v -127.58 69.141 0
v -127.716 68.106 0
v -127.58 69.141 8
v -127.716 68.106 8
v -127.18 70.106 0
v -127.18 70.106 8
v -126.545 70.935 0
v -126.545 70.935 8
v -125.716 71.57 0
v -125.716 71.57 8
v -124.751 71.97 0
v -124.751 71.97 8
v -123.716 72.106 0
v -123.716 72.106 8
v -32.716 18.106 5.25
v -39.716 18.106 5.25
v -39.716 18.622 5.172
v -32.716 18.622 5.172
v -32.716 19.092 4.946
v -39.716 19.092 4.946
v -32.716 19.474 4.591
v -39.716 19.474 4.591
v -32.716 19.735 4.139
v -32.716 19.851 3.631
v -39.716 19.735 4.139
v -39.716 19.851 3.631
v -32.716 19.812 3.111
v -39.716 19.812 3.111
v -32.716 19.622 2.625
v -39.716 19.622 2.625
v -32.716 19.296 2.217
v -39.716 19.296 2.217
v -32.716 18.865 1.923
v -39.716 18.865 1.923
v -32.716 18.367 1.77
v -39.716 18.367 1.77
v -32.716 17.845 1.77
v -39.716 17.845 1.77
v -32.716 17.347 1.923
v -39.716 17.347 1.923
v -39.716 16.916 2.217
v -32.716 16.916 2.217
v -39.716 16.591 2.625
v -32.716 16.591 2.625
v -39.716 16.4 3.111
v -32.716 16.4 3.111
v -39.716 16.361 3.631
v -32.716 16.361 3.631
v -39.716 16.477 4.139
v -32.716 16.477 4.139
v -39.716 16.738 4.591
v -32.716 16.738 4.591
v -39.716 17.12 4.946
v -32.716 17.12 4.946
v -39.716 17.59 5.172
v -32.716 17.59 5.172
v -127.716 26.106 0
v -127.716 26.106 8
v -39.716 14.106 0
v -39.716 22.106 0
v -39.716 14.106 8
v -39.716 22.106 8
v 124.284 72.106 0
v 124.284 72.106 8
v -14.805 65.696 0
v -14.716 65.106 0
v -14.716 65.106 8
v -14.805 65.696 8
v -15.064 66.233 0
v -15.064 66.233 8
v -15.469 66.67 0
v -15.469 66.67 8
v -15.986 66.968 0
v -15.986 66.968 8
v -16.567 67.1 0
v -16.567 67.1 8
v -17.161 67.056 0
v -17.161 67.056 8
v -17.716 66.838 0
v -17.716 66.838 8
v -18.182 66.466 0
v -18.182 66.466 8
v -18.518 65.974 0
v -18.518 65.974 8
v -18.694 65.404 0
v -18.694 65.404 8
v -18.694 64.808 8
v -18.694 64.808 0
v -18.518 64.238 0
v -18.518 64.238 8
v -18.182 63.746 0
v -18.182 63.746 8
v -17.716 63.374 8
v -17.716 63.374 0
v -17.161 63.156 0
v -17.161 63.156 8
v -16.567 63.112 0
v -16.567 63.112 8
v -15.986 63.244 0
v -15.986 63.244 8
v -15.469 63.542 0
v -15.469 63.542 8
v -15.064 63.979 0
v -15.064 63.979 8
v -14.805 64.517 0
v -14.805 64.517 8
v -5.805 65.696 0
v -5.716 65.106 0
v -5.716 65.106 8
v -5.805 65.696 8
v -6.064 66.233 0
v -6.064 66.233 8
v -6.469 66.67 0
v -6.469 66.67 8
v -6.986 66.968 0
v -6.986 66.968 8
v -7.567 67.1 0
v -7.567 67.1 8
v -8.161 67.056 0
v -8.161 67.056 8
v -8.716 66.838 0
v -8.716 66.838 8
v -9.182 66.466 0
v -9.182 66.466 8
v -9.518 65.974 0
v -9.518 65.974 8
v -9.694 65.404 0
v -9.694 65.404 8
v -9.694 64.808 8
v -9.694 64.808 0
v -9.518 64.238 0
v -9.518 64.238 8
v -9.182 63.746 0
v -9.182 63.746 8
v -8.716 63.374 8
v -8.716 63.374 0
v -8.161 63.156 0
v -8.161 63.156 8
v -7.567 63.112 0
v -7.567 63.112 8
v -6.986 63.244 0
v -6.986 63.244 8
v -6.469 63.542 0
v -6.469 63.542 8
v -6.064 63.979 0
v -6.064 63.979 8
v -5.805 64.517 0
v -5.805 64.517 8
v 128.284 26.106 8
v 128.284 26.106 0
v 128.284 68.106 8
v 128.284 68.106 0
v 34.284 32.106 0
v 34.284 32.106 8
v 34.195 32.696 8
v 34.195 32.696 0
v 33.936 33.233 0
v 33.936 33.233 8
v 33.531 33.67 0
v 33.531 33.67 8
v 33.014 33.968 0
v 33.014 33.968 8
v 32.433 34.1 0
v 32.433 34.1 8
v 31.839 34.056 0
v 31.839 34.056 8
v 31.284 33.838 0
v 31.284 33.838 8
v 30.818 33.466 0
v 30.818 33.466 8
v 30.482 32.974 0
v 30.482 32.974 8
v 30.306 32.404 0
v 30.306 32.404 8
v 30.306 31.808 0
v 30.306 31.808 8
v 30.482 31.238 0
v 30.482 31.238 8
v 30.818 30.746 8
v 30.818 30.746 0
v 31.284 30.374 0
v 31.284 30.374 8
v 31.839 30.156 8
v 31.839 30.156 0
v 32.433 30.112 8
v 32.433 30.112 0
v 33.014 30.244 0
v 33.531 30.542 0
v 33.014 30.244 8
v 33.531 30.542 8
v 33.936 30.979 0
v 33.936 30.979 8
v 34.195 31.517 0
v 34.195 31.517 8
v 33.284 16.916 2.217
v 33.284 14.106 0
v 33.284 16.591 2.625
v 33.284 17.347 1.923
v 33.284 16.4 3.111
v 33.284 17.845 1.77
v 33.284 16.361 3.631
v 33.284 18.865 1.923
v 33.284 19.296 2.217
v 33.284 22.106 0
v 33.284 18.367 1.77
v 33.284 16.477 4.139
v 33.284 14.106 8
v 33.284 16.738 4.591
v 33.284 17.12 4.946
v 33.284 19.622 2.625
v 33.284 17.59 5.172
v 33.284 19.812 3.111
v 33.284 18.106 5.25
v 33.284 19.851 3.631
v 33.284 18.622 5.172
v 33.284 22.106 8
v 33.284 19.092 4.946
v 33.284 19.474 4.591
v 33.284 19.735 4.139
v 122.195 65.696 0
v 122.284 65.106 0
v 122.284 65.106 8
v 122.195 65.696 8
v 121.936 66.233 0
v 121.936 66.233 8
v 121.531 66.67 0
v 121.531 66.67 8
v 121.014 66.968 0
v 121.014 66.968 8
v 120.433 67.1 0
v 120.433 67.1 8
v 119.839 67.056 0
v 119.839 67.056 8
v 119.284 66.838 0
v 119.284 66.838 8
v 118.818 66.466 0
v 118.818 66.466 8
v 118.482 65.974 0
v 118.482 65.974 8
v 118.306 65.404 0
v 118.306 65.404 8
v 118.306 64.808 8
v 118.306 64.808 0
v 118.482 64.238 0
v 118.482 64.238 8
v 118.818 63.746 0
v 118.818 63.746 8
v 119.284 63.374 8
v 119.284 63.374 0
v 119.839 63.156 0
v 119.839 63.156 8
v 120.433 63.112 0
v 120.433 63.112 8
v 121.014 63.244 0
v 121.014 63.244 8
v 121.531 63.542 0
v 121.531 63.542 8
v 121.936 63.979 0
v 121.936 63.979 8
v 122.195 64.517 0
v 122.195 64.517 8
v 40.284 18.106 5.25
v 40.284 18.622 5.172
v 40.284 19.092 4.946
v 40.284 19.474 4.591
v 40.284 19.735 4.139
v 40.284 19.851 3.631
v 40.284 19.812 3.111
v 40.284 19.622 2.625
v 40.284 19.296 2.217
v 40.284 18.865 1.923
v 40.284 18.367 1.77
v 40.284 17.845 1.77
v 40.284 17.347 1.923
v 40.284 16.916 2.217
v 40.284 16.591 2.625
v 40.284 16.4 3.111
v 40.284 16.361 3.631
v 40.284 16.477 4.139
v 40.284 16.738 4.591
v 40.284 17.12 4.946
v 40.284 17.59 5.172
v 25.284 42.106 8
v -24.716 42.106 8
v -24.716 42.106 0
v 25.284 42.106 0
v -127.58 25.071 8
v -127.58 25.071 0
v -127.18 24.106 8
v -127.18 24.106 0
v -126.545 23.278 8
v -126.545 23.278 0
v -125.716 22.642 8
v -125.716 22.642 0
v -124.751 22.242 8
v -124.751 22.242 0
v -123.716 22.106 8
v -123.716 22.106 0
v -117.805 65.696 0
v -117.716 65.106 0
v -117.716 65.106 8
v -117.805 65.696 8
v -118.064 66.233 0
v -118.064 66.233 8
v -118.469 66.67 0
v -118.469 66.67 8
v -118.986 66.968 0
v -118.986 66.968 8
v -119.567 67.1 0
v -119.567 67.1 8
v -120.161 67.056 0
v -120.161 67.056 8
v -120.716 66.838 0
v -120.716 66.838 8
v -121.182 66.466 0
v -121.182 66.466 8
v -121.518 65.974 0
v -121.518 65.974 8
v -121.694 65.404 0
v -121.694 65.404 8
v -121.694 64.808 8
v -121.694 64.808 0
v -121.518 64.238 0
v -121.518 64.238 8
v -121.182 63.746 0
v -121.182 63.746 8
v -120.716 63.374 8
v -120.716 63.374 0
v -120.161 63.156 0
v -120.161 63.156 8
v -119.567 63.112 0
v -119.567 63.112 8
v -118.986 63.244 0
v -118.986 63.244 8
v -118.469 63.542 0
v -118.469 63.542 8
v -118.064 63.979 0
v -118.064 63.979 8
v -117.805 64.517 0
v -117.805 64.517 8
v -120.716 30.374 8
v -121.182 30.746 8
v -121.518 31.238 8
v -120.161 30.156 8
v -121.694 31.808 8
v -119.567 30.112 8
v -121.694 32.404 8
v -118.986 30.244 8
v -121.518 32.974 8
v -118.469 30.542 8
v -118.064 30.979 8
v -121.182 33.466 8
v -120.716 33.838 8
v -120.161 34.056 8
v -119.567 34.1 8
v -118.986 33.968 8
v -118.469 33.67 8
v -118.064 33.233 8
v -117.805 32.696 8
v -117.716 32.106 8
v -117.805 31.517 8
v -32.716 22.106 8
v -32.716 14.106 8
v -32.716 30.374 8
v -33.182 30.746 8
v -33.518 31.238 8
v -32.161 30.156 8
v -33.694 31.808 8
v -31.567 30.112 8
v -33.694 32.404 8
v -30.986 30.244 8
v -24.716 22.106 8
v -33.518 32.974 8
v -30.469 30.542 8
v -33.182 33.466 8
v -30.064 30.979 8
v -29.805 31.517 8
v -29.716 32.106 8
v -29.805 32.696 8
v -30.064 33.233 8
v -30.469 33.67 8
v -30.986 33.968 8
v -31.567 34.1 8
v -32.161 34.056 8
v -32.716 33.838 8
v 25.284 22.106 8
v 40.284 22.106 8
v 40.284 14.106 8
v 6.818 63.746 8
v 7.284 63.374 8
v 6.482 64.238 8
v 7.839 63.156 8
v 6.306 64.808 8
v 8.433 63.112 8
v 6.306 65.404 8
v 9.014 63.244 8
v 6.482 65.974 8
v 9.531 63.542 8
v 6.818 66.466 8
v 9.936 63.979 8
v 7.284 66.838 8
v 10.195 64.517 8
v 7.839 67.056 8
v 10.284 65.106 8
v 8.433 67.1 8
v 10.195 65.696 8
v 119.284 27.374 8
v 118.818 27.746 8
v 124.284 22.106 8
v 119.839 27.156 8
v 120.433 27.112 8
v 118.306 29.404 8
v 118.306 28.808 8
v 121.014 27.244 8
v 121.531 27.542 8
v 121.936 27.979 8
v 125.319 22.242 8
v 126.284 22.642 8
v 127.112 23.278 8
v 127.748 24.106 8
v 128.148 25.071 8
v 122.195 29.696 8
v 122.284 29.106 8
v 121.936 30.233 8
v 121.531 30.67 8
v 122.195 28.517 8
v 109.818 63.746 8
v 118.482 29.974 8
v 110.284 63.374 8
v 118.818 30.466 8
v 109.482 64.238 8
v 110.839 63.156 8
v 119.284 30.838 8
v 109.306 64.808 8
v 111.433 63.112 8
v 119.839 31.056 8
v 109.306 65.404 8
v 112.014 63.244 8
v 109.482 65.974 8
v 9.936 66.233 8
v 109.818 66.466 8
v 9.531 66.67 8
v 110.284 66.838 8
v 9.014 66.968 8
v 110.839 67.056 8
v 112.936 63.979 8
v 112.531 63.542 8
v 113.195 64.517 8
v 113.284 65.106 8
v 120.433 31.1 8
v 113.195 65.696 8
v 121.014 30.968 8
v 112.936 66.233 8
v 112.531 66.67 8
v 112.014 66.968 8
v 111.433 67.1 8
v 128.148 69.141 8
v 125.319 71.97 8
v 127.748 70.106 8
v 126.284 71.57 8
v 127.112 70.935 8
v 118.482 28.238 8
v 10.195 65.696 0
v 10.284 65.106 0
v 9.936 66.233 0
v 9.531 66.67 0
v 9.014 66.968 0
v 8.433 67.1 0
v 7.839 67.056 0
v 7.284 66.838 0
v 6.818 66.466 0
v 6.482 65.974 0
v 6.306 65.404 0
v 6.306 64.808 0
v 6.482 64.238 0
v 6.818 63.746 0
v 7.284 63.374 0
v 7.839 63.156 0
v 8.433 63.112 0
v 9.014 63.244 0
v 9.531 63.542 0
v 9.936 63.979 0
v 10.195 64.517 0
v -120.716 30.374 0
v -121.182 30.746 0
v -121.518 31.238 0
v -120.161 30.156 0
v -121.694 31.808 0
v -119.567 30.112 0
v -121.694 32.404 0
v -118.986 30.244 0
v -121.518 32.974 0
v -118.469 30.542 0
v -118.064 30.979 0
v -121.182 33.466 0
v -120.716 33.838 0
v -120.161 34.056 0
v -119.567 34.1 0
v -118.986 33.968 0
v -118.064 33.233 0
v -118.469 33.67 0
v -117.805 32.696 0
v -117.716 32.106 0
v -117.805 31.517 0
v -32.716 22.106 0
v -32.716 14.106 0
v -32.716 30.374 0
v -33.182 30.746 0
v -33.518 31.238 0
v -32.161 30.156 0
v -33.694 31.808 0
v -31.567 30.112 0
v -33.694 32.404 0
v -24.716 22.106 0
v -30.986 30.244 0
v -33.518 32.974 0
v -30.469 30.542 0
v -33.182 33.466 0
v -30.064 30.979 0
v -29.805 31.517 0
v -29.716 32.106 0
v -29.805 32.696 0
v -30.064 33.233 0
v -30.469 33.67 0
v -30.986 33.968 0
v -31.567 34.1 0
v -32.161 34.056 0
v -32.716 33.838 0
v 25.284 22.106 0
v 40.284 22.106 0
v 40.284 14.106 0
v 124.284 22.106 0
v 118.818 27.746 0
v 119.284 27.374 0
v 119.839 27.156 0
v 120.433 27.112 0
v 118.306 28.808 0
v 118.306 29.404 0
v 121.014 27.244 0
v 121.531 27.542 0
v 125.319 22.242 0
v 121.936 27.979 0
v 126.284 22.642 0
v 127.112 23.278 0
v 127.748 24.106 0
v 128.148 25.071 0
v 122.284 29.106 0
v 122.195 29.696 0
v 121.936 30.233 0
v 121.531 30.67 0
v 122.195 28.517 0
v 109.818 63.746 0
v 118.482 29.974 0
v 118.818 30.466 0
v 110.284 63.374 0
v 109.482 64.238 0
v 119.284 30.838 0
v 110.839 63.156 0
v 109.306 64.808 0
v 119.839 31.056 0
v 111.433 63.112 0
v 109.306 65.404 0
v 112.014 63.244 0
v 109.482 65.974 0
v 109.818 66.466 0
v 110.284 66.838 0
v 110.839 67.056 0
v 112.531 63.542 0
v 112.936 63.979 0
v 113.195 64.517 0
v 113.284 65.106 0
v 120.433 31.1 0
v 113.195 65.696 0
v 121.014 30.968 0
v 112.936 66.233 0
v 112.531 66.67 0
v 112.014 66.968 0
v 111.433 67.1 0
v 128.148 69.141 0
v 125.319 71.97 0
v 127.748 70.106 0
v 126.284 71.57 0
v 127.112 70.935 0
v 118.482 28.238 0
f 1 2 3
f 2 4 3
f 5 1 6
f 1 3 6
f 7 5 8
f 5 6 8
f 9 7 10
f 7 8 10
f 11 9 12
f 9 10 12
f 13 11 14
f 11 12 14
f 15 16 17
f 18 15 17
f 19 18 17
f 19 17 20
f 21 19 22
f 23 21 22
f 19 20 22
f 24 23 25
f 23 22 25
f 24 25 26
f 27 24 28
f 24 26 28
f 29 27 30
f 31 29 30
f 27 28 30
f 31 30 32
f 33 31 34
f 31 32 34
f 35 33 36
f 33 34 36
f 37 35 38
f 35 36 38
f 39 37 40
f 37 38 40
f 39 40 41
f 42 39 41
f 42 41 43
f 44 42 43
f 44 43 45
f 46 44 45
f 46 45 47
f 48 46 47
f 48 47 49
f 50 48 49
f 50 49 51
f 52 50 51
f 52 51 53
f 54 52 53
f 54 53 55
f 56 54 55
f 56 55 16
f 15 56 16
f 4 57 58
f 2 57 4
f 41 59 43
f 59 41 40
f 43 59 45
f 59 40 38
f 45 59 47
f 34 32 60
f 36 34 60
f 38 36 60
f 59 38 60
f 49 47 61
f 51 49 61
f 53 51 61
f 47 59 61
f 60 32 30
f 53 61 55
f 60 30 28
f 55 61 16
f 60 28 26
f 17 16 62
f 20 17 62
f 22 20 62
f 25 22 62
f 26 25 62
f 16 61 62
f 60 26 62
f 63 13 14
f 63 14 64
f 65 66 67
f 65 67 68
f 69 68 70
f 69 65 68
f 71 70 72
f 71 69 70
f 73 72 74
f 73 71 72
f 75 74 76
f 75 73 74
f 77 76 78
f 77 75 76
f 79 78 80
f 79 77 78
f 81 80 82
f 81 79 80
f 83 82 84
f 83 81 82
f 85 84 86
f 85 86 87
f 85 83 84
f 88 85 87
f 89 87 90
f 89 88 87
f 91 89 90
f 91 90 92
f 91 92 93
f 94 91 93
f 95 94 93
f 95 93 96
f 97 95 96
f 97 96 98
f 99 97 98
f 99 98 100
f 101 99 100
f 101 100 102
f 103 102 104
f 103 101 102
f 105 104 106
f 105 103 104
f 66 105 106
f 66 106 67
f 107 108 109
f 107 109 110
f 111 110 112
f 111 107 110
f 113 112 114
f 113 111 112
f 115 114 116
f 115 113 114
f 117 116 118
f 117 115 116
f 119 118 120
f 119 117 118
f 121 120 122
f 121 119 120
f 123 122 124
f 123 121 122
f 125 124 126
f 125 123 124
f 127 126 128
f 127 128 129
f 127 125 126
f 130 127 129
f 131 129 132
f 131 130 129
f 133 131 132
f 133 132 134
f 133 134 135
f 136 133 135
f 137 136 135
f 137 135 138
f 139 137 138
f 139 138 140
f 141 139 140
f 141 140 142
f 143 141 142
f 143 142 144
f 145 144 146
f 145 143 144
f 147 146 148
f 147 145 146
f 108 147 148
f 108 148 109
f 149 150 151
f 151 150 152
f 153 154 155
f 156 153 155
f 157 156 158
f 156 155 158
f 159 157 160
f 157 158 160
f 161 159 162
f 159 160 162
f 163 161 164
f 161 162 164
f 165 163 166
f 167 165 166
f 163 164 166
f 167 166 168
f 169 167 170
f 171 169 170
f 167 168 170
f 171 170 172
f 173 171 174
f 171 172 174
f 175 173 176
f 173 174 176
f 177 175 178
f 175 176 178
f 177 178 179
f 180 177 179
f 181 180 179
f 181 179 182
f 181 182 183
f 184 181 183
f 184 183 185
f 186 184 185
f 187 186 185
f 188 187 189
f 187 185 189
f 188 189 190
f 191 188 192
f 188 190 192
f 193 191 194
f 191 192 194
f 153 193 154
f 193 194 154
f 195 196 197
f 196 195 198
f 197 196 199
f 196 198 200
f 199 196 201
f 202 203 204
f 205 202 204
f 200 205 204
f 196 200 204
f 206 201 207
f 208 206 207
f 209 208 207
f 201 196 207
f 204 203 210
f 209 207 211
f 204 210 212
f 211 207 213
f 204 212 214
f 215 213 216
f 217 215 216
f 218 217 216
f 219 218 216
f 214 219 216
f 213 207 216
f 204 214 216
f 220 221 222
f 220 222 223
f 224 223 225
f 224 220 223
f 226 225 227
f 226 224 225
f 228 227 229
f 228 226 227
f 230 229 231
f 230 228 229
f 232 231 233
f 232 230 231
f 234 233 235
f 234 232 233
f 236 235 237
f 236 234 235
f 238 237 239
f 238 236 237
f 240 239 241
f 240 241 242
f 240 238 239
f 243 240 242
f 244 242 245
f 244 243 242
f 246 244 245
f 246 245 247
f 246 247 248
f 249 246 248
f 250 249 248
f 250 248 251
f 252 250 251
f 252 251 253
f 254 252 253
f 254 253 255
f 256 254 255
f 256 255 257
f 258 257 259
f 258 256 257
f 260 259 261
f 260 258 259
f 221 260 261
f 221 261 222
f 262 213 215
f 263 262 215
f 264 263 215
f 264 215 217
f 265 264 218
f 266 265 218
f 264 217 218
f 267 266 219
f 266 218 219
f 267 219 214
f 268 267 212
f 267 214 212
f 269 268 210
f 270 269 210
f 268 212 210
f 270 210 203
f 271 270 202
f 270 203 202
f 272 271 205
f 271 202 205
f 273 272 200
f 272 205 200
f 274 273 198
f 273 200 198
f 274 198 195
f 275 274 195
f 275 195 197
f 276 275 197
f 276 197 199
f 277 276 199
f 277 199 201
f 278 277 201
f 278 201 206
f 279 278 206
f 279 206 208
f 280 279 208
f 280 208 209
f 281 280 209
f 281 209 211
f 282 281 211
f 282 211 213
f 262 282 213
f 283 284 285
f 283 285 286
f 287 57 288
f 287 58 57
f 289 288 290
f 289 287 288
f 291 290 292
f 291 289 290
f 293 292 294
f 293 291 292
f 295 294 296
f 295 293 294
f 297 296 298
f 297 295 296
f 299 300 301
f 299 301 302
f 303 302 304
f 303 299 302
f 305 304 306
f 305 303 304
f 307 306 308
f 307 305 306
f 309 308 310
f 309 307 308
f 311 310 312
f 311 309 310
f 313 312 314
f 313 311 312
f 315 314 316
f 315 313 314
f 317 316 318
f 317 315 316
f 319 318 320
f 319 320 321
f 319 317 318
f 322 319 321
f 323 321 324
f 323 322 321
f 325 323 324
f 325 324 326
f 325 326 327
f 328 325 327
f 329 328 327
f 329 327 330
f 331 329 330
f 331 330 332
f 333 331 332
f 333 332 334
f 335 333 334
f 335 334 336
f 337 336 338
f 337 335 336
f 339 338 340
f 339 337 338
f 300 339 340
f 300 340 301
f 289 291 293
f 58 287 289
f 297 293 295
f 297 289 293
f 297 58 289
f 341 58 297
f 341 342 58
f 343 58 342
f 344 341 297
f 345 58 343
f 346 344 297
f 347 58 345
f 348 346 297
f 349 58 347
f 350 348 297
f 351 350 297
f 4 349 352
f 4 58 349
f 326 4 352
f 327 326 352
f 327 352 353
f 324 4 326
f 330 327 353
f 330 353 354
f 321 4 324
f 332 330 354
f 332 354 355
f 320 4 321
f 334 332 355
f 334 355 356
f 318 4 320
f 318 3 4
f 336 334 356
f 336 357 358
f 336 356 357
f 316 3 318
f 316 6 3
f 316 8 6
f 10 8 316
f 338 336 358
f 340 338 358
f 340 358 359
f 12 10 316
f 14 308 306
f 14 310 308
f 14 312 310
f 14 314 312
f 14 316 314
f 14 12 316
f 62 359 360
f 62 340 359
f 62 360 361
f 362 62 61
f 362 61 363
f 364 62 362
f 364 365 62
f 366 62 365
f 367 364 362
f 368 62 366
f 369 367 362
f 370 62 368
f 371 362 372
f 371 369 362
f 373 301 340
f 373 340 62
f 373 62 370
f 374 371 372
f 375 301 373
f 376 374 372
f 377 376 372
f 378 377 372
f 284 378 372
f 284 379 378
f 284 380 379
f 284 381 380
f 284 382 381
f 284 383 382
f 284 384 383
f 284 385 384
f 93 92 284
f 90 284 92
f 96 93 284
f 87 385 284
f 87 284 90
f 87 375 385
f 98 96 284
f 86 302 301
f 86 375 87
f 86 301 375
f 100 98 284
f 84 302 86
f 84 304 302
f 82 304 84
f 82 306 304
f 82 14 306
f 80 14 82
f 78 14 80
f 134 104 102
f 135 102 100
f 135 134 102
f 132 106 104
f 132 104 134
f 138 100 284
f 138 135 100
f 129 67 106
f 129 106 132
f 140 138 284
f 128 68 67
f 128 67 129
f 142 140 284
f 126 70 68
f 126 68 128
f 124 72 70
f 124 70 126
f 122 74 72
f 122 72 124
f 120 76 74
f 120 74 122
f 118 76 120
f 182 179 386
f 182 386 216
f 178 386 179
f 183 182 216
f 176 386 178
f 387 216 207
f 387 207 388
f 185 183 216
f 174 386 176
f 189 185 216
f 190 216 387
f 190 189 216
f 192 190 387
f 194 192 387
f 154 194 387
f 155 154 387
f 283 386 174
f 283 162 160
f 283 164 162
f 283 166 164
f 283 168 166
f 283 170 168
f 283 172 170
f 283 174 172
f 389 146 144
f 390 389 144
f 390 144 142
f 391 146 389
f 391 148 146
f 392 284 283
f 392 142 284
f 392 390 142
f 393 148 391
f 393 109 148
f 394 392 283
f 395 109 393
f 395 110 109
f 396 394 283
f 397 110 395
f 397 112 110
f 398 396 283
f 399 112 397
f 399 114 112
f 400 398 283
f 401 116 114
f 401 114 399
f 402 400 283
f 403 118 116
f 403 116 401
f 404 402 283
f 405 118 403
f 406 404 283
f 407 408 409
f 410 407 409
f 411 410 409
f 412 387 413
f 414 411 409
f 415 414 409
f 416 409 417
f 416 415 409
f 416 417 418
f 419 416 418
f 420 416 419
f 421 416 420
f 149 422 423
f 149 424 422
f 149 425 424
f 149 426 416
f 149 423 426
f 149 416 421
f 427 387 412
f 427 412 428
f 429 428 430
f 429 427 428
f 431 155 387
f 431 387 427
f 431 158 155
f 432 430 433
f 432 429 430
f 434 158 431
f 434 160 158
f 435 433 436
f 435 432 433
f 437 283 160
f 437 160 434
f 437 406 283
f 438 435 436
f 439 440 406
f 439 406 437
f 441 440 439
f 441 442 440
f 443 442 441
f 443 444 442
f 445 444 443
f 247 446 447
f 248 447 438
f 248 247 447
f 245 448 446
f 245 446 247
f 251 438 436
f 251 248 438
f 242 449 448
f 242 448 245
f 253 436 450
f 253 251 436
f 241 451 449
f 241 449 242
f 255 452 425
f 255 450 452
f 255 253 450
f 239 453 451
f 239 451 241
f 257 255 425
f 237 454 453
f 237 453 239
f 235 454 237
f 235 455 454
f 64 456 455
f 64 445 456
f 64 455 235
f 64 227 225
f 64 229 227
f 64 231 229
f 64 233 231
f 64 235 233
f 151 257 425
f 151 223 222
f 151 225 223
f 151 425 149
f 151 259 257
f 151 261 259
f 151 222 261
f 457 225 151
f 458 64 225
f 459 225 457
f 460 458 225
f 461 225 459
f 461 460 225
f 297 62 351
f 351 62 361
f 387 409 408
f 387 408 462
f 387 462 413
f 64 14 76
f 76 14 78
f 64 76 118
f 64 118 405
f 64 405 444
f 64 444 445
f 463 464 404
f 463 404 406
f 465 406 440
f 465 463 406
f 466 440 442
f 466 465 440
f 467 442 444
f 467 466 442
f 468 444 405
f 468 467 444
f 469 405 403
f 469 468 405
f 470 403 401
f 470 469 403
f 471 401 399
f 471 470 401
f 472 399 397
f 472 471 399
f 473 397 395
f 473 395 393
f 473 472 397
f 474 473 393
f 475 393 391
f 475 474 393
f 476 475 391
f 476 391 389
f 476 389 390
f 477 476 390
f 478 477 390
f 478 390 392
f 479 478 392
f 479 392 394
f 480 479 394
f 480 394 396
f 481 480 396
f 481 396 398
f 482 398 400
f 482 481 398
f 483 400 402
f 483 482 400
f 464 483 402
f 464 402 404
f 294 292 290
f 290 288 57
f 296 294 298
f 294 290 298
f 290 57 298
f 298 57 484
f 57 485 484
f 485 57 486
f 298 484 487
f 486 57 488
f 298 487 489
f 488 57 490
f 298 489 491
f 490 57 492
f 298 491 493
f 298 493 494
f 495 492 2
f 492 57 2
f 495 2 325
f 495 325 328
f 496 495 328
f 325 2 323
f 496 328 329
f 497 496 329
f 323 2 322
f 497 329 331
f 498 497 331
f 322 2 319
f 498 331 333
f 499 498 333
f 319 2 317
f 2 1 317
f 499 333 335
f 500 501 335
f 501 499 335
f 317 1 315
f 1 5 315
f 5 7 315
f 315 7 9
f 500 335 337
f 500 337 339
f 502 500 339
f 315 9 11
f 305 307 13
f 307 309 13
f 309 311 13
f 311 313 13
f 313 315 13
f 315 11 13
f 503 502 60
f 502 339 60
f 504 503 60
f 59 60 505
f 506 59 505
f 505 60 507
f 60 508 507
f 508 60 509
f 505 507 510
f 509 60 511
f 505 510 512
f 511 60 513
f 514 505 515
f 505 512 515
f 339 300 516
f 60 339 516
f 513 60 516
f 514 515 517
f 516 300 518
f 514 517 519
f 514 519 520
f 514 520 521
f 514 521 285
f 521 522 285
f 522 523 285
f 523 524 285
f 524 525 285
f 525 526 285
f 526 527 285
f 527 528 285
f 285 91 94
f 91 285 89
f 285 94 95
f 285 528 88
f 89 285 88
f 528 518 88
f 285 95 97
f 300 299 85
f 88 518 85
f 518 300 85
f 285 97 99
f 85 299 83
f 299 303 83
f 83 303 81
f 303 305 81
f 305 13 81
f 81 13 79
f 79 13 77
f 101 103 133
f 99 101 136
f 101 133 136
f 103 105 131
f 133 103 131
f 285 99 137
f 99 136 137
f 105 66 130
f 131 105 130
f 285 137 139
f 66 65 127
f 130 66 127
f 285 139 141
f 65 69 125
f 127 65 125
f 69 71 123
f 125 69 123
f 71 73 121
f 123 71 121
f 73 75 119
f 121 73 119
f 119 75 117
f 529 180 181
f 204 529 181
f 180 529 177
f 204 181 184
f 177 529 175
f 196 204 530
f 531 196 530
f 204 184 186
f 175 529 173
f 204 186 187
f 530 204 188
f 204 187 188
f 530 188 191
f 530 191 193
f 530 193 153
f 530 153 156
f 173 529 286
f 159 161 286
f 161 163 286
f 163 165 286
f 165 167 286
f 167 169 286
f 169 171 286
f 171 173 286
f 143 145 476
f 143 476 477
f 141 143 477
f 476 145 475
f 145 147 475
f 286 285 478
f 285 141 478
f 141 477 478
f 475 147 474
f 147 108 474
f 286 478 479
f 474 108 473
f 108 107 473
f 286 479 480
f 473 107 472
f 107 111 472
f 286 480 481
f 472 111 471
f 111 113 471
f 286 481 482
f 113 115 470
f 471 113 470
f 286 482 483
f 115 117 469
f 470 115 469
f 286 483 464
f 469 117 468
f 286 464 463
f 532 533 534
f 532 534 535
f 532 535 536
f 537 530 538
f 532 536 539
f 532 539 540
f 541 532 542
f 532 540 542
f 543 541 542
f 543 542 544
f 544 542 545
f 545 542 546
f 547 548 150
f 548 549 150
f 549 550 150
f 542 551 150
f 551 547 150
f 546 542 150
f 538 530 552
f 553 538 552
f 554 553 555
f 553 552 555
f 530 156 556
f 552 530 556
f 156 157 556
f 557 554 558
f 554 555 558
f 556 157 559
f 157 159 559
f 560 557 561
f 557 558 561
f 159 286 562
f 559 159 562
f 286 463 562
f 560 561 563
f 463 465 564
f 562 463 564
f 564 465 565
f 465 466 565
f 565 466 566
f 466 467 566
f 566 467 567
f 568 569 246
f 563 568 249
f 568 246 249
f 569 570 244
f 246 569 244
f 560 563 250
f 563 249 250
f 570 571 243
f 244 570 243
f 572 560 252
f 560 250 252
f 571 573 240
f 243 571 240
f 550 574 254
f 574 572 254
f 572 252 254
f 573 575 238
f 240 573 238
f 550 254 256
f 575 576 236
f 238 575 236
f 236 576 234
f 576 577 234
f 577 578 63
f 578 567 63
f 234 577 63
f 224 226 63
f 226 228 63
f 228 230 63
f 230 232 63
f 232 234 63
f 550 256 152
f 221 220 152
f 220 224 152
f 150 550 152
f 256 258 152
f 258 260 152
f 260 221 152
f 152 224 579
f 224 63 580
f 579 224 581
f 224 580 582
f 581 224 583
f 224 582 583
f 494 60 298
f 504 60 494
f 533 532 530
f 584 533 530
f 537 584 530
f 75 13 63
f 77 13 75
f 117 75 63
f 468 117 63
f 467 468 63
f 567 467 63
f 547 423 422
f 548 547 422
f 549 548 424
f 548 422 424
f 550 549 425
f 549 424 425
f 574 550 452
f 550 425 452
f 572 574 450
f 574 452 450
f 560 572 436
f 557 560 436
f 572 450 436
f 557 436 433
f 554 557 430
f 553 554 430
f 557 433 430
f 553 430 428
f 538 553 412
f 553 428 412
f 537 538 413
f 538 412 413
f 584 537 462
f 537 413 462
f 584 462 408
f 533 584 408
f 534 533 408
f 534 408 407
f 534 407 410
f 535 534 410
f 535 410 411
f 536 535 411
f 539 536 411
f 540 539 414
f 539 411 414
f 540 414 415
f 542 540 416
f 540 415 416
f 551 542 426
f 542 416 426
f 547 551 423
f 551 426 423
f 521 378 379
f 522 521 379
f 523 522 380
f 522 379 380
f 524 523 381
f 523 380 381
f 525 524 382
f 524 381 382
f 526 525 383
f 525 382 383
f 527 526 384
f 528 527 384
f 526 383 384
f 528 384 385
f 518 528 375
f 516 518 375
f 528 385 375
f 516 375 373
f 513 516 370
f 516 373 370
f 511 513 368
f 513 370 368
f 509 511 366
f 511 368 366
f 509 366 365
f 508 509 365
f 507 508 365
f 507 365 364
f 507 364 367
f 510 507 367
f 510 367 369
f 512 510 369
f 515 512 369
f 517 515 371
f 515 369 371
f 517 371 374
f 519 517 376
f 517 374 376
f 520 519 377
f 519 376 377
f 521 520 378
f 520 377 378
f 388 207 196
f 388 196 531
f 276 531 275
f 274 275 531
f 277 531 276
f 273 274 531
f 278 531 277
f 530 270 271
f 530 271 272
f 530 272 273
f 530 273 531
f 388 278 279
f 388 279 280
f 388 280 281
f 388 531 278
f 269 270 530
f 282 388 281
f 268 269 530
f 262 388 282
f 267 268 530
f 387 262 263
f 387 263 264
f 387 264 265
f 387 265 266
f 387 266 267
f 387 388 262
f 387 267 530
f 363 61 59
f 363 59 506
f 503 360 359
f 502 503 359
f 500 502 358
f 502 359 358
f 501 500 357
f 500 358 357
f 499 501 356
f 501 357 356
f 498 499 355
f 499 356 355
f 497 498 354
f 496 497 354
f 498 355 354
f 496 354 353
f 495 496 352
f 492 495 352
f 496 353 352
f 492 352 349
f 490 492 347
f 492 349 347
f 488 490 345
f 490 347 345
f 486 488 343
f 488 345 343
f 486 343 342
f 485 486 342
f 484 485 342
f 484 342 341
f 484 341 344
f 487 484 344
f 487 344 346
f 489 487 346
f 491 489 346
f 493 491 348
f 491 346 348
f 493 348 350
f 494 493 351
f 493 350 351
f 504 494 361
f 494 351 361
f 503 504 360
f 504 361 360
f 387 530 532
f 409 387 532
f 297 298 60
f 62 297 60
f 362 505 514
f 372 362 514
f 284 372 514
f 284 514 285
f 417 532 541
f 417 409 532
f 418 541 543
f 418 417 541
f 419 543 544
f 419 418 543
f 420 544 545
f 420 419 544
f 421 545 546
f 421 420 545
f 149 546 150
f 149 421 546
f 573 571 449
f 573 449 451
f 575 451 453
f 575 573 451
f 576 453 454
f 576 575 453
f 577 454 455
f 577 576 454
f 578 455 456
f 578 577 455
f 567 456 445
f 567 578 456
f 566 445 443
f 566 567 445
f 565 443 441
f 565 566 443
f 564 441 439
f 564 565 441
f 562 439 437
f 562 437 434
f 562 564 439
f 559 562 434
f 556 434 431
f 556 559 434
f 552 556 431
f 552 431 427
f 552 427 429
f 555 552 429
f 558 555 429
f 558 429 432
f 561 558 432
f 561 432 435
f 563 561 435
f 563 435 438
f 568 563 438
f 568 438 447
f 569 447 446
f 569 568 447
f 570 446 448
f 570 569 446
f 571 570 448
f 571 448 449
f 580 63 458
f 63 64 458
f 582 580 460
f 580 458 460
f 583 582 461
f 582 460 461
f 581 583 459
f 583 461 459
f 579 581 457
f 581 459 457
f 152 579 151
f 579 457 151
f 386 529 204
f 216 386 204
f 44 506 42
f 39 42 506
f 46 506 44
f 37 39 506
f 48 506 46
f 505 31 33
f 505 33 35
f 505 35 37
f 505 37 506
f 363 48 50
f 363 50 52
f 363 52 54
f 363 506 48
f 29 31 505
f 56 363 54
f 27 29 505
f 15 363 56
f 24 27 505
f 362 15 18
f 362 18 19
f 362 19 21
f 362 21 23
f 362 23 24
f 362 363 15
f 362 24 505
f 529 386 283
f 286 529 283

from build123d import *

# Parameters (mm, degrees)
SKETCH1_W           = 256
SKETCH1_H           = 50
SKETCH1_R           = 2
BOSS_EXTRUDE1_DEPTH = 8
FILLET1_R           = 4
SKETCH2_W           = 7
SKETCH2_H           = 8
BOSS_EXTRUDE2_DEPTH = 8
SKETCH3_W           = 50
SKETCH3_H           = 20
CUT_EXTRUDE1_DEPTH  = 8
SKETCH4_R           = 2
CUT_EXTRUDE2_DEPTH  = 8
SKETCH5_R           = 1.75
CUT_EXTRUDE3_DEPTH  = 113


with BuildPart() as part:
    # Sketch1 → Boss-Extrude1 (new body)
    with BuildSketch(Plane.XY):
        with Locations((0.283809042, 47.106089777)):
            Rectangle(SKETCH1_W, SKETCH1_H)
        with Locations((120.283809042, 65.106089777)):
            Circle(SKETCH1_R, mode=Mode.SUBTRACT)
        with Locations((111.283809042, 65.106089777)):
            Circle(SKETCH1_R, mode=Mode.SUBTRACT)
        with Locations((8.283809042, 65.106089777)):
            Circle(SKETCH1_R, mode=Mode.SUBTRACT)
        with Locations((-7.716190958, 65.106089777)):
            Circle(SKETCH1_R, mode=Mode.SUBTRACT)
        with Locations((-16.716190958, 65.106089777)):
            Circle(SKETCH1_R, mode=Mode.SUBTRACT)
        with Locations((-119.716190958, 65.106089777)):
            Circle(SKETCH1_R, mode=Mode.SUBTRACT)
    extrude(amount=BOSS_EXTRUDE1_DEPTH)

    # Fillet1
    fillet1_edges = [part.edges().sort_by_distance(p)[0] for p in [
        (-127.716190958, 72.106089777, 4),
        (128.283809042, 72.106089777, 4),
        (128.283809042, 22.106089777, 4),
        (-127.716190958, 22.106089777, 4),
    ]]
    fillet(fillet1_edges, radius=FILLET1_R)

    # Sketch2 → Boss-Extrude2 (add)
    with BuildSketch(Plane.XY.offset(8)):
        with Locations((36.783809042, 18.106089777)):
            Rectangle(SKETCH2_W, SKETCH2_H)
        with Locations((-36.216190958, 18.106089777)):
            Rectangle(SKETCH2_W, SKETCH2_H)
    extrude(amount=-BOSS_EXTRUDE2_DEPTH)

    # Sketch3 → Cut-Extrude1 (cut)
    with BuildSketch(Plane.XY.offset(8)):
        with Locations((0.283809042, 32.106089777)):
            Rectangle(SKETCH3_W, SKETCH3_H)
    extrude(amount=-CUT_EXTRUDE1_DEPTH, mode=Mode.SUBTRACT)

    # Sketch4 → Cut-Extrude2 (cut)
    with BuildSketch(Plane.XY.offset(8)):
        with Locations((-31.716190958, 32.106089777)):
            Circle(SKETCH4_R)
        with Locations((32.283809042, 32.106089777)):
            Circle(SKETCH4_R)
        with Locations((-119.716190958, 32.106089777)):
            Circle(SKETCH4_R)
        with Locations((120.283809042, 29.106089777)):
            Circle(SKETCH4_R)
    extrude(amount=-CUT_EXTRUDE2_DEPTH, mode=Mode.SUBTRACT)

    # Sketch5 → Cut-Extrude3 (cut)
    with BuildSketch(Plane.ZY.offset(39.716190958)):
        with Locations((3.5, 18.106089777)):
            Circle(SKETCH5_R)
    extrude(amount=-CUT_EXTRUDE3_DEPTH, mode=Mode.SUBTRACT)


solid = part.part
